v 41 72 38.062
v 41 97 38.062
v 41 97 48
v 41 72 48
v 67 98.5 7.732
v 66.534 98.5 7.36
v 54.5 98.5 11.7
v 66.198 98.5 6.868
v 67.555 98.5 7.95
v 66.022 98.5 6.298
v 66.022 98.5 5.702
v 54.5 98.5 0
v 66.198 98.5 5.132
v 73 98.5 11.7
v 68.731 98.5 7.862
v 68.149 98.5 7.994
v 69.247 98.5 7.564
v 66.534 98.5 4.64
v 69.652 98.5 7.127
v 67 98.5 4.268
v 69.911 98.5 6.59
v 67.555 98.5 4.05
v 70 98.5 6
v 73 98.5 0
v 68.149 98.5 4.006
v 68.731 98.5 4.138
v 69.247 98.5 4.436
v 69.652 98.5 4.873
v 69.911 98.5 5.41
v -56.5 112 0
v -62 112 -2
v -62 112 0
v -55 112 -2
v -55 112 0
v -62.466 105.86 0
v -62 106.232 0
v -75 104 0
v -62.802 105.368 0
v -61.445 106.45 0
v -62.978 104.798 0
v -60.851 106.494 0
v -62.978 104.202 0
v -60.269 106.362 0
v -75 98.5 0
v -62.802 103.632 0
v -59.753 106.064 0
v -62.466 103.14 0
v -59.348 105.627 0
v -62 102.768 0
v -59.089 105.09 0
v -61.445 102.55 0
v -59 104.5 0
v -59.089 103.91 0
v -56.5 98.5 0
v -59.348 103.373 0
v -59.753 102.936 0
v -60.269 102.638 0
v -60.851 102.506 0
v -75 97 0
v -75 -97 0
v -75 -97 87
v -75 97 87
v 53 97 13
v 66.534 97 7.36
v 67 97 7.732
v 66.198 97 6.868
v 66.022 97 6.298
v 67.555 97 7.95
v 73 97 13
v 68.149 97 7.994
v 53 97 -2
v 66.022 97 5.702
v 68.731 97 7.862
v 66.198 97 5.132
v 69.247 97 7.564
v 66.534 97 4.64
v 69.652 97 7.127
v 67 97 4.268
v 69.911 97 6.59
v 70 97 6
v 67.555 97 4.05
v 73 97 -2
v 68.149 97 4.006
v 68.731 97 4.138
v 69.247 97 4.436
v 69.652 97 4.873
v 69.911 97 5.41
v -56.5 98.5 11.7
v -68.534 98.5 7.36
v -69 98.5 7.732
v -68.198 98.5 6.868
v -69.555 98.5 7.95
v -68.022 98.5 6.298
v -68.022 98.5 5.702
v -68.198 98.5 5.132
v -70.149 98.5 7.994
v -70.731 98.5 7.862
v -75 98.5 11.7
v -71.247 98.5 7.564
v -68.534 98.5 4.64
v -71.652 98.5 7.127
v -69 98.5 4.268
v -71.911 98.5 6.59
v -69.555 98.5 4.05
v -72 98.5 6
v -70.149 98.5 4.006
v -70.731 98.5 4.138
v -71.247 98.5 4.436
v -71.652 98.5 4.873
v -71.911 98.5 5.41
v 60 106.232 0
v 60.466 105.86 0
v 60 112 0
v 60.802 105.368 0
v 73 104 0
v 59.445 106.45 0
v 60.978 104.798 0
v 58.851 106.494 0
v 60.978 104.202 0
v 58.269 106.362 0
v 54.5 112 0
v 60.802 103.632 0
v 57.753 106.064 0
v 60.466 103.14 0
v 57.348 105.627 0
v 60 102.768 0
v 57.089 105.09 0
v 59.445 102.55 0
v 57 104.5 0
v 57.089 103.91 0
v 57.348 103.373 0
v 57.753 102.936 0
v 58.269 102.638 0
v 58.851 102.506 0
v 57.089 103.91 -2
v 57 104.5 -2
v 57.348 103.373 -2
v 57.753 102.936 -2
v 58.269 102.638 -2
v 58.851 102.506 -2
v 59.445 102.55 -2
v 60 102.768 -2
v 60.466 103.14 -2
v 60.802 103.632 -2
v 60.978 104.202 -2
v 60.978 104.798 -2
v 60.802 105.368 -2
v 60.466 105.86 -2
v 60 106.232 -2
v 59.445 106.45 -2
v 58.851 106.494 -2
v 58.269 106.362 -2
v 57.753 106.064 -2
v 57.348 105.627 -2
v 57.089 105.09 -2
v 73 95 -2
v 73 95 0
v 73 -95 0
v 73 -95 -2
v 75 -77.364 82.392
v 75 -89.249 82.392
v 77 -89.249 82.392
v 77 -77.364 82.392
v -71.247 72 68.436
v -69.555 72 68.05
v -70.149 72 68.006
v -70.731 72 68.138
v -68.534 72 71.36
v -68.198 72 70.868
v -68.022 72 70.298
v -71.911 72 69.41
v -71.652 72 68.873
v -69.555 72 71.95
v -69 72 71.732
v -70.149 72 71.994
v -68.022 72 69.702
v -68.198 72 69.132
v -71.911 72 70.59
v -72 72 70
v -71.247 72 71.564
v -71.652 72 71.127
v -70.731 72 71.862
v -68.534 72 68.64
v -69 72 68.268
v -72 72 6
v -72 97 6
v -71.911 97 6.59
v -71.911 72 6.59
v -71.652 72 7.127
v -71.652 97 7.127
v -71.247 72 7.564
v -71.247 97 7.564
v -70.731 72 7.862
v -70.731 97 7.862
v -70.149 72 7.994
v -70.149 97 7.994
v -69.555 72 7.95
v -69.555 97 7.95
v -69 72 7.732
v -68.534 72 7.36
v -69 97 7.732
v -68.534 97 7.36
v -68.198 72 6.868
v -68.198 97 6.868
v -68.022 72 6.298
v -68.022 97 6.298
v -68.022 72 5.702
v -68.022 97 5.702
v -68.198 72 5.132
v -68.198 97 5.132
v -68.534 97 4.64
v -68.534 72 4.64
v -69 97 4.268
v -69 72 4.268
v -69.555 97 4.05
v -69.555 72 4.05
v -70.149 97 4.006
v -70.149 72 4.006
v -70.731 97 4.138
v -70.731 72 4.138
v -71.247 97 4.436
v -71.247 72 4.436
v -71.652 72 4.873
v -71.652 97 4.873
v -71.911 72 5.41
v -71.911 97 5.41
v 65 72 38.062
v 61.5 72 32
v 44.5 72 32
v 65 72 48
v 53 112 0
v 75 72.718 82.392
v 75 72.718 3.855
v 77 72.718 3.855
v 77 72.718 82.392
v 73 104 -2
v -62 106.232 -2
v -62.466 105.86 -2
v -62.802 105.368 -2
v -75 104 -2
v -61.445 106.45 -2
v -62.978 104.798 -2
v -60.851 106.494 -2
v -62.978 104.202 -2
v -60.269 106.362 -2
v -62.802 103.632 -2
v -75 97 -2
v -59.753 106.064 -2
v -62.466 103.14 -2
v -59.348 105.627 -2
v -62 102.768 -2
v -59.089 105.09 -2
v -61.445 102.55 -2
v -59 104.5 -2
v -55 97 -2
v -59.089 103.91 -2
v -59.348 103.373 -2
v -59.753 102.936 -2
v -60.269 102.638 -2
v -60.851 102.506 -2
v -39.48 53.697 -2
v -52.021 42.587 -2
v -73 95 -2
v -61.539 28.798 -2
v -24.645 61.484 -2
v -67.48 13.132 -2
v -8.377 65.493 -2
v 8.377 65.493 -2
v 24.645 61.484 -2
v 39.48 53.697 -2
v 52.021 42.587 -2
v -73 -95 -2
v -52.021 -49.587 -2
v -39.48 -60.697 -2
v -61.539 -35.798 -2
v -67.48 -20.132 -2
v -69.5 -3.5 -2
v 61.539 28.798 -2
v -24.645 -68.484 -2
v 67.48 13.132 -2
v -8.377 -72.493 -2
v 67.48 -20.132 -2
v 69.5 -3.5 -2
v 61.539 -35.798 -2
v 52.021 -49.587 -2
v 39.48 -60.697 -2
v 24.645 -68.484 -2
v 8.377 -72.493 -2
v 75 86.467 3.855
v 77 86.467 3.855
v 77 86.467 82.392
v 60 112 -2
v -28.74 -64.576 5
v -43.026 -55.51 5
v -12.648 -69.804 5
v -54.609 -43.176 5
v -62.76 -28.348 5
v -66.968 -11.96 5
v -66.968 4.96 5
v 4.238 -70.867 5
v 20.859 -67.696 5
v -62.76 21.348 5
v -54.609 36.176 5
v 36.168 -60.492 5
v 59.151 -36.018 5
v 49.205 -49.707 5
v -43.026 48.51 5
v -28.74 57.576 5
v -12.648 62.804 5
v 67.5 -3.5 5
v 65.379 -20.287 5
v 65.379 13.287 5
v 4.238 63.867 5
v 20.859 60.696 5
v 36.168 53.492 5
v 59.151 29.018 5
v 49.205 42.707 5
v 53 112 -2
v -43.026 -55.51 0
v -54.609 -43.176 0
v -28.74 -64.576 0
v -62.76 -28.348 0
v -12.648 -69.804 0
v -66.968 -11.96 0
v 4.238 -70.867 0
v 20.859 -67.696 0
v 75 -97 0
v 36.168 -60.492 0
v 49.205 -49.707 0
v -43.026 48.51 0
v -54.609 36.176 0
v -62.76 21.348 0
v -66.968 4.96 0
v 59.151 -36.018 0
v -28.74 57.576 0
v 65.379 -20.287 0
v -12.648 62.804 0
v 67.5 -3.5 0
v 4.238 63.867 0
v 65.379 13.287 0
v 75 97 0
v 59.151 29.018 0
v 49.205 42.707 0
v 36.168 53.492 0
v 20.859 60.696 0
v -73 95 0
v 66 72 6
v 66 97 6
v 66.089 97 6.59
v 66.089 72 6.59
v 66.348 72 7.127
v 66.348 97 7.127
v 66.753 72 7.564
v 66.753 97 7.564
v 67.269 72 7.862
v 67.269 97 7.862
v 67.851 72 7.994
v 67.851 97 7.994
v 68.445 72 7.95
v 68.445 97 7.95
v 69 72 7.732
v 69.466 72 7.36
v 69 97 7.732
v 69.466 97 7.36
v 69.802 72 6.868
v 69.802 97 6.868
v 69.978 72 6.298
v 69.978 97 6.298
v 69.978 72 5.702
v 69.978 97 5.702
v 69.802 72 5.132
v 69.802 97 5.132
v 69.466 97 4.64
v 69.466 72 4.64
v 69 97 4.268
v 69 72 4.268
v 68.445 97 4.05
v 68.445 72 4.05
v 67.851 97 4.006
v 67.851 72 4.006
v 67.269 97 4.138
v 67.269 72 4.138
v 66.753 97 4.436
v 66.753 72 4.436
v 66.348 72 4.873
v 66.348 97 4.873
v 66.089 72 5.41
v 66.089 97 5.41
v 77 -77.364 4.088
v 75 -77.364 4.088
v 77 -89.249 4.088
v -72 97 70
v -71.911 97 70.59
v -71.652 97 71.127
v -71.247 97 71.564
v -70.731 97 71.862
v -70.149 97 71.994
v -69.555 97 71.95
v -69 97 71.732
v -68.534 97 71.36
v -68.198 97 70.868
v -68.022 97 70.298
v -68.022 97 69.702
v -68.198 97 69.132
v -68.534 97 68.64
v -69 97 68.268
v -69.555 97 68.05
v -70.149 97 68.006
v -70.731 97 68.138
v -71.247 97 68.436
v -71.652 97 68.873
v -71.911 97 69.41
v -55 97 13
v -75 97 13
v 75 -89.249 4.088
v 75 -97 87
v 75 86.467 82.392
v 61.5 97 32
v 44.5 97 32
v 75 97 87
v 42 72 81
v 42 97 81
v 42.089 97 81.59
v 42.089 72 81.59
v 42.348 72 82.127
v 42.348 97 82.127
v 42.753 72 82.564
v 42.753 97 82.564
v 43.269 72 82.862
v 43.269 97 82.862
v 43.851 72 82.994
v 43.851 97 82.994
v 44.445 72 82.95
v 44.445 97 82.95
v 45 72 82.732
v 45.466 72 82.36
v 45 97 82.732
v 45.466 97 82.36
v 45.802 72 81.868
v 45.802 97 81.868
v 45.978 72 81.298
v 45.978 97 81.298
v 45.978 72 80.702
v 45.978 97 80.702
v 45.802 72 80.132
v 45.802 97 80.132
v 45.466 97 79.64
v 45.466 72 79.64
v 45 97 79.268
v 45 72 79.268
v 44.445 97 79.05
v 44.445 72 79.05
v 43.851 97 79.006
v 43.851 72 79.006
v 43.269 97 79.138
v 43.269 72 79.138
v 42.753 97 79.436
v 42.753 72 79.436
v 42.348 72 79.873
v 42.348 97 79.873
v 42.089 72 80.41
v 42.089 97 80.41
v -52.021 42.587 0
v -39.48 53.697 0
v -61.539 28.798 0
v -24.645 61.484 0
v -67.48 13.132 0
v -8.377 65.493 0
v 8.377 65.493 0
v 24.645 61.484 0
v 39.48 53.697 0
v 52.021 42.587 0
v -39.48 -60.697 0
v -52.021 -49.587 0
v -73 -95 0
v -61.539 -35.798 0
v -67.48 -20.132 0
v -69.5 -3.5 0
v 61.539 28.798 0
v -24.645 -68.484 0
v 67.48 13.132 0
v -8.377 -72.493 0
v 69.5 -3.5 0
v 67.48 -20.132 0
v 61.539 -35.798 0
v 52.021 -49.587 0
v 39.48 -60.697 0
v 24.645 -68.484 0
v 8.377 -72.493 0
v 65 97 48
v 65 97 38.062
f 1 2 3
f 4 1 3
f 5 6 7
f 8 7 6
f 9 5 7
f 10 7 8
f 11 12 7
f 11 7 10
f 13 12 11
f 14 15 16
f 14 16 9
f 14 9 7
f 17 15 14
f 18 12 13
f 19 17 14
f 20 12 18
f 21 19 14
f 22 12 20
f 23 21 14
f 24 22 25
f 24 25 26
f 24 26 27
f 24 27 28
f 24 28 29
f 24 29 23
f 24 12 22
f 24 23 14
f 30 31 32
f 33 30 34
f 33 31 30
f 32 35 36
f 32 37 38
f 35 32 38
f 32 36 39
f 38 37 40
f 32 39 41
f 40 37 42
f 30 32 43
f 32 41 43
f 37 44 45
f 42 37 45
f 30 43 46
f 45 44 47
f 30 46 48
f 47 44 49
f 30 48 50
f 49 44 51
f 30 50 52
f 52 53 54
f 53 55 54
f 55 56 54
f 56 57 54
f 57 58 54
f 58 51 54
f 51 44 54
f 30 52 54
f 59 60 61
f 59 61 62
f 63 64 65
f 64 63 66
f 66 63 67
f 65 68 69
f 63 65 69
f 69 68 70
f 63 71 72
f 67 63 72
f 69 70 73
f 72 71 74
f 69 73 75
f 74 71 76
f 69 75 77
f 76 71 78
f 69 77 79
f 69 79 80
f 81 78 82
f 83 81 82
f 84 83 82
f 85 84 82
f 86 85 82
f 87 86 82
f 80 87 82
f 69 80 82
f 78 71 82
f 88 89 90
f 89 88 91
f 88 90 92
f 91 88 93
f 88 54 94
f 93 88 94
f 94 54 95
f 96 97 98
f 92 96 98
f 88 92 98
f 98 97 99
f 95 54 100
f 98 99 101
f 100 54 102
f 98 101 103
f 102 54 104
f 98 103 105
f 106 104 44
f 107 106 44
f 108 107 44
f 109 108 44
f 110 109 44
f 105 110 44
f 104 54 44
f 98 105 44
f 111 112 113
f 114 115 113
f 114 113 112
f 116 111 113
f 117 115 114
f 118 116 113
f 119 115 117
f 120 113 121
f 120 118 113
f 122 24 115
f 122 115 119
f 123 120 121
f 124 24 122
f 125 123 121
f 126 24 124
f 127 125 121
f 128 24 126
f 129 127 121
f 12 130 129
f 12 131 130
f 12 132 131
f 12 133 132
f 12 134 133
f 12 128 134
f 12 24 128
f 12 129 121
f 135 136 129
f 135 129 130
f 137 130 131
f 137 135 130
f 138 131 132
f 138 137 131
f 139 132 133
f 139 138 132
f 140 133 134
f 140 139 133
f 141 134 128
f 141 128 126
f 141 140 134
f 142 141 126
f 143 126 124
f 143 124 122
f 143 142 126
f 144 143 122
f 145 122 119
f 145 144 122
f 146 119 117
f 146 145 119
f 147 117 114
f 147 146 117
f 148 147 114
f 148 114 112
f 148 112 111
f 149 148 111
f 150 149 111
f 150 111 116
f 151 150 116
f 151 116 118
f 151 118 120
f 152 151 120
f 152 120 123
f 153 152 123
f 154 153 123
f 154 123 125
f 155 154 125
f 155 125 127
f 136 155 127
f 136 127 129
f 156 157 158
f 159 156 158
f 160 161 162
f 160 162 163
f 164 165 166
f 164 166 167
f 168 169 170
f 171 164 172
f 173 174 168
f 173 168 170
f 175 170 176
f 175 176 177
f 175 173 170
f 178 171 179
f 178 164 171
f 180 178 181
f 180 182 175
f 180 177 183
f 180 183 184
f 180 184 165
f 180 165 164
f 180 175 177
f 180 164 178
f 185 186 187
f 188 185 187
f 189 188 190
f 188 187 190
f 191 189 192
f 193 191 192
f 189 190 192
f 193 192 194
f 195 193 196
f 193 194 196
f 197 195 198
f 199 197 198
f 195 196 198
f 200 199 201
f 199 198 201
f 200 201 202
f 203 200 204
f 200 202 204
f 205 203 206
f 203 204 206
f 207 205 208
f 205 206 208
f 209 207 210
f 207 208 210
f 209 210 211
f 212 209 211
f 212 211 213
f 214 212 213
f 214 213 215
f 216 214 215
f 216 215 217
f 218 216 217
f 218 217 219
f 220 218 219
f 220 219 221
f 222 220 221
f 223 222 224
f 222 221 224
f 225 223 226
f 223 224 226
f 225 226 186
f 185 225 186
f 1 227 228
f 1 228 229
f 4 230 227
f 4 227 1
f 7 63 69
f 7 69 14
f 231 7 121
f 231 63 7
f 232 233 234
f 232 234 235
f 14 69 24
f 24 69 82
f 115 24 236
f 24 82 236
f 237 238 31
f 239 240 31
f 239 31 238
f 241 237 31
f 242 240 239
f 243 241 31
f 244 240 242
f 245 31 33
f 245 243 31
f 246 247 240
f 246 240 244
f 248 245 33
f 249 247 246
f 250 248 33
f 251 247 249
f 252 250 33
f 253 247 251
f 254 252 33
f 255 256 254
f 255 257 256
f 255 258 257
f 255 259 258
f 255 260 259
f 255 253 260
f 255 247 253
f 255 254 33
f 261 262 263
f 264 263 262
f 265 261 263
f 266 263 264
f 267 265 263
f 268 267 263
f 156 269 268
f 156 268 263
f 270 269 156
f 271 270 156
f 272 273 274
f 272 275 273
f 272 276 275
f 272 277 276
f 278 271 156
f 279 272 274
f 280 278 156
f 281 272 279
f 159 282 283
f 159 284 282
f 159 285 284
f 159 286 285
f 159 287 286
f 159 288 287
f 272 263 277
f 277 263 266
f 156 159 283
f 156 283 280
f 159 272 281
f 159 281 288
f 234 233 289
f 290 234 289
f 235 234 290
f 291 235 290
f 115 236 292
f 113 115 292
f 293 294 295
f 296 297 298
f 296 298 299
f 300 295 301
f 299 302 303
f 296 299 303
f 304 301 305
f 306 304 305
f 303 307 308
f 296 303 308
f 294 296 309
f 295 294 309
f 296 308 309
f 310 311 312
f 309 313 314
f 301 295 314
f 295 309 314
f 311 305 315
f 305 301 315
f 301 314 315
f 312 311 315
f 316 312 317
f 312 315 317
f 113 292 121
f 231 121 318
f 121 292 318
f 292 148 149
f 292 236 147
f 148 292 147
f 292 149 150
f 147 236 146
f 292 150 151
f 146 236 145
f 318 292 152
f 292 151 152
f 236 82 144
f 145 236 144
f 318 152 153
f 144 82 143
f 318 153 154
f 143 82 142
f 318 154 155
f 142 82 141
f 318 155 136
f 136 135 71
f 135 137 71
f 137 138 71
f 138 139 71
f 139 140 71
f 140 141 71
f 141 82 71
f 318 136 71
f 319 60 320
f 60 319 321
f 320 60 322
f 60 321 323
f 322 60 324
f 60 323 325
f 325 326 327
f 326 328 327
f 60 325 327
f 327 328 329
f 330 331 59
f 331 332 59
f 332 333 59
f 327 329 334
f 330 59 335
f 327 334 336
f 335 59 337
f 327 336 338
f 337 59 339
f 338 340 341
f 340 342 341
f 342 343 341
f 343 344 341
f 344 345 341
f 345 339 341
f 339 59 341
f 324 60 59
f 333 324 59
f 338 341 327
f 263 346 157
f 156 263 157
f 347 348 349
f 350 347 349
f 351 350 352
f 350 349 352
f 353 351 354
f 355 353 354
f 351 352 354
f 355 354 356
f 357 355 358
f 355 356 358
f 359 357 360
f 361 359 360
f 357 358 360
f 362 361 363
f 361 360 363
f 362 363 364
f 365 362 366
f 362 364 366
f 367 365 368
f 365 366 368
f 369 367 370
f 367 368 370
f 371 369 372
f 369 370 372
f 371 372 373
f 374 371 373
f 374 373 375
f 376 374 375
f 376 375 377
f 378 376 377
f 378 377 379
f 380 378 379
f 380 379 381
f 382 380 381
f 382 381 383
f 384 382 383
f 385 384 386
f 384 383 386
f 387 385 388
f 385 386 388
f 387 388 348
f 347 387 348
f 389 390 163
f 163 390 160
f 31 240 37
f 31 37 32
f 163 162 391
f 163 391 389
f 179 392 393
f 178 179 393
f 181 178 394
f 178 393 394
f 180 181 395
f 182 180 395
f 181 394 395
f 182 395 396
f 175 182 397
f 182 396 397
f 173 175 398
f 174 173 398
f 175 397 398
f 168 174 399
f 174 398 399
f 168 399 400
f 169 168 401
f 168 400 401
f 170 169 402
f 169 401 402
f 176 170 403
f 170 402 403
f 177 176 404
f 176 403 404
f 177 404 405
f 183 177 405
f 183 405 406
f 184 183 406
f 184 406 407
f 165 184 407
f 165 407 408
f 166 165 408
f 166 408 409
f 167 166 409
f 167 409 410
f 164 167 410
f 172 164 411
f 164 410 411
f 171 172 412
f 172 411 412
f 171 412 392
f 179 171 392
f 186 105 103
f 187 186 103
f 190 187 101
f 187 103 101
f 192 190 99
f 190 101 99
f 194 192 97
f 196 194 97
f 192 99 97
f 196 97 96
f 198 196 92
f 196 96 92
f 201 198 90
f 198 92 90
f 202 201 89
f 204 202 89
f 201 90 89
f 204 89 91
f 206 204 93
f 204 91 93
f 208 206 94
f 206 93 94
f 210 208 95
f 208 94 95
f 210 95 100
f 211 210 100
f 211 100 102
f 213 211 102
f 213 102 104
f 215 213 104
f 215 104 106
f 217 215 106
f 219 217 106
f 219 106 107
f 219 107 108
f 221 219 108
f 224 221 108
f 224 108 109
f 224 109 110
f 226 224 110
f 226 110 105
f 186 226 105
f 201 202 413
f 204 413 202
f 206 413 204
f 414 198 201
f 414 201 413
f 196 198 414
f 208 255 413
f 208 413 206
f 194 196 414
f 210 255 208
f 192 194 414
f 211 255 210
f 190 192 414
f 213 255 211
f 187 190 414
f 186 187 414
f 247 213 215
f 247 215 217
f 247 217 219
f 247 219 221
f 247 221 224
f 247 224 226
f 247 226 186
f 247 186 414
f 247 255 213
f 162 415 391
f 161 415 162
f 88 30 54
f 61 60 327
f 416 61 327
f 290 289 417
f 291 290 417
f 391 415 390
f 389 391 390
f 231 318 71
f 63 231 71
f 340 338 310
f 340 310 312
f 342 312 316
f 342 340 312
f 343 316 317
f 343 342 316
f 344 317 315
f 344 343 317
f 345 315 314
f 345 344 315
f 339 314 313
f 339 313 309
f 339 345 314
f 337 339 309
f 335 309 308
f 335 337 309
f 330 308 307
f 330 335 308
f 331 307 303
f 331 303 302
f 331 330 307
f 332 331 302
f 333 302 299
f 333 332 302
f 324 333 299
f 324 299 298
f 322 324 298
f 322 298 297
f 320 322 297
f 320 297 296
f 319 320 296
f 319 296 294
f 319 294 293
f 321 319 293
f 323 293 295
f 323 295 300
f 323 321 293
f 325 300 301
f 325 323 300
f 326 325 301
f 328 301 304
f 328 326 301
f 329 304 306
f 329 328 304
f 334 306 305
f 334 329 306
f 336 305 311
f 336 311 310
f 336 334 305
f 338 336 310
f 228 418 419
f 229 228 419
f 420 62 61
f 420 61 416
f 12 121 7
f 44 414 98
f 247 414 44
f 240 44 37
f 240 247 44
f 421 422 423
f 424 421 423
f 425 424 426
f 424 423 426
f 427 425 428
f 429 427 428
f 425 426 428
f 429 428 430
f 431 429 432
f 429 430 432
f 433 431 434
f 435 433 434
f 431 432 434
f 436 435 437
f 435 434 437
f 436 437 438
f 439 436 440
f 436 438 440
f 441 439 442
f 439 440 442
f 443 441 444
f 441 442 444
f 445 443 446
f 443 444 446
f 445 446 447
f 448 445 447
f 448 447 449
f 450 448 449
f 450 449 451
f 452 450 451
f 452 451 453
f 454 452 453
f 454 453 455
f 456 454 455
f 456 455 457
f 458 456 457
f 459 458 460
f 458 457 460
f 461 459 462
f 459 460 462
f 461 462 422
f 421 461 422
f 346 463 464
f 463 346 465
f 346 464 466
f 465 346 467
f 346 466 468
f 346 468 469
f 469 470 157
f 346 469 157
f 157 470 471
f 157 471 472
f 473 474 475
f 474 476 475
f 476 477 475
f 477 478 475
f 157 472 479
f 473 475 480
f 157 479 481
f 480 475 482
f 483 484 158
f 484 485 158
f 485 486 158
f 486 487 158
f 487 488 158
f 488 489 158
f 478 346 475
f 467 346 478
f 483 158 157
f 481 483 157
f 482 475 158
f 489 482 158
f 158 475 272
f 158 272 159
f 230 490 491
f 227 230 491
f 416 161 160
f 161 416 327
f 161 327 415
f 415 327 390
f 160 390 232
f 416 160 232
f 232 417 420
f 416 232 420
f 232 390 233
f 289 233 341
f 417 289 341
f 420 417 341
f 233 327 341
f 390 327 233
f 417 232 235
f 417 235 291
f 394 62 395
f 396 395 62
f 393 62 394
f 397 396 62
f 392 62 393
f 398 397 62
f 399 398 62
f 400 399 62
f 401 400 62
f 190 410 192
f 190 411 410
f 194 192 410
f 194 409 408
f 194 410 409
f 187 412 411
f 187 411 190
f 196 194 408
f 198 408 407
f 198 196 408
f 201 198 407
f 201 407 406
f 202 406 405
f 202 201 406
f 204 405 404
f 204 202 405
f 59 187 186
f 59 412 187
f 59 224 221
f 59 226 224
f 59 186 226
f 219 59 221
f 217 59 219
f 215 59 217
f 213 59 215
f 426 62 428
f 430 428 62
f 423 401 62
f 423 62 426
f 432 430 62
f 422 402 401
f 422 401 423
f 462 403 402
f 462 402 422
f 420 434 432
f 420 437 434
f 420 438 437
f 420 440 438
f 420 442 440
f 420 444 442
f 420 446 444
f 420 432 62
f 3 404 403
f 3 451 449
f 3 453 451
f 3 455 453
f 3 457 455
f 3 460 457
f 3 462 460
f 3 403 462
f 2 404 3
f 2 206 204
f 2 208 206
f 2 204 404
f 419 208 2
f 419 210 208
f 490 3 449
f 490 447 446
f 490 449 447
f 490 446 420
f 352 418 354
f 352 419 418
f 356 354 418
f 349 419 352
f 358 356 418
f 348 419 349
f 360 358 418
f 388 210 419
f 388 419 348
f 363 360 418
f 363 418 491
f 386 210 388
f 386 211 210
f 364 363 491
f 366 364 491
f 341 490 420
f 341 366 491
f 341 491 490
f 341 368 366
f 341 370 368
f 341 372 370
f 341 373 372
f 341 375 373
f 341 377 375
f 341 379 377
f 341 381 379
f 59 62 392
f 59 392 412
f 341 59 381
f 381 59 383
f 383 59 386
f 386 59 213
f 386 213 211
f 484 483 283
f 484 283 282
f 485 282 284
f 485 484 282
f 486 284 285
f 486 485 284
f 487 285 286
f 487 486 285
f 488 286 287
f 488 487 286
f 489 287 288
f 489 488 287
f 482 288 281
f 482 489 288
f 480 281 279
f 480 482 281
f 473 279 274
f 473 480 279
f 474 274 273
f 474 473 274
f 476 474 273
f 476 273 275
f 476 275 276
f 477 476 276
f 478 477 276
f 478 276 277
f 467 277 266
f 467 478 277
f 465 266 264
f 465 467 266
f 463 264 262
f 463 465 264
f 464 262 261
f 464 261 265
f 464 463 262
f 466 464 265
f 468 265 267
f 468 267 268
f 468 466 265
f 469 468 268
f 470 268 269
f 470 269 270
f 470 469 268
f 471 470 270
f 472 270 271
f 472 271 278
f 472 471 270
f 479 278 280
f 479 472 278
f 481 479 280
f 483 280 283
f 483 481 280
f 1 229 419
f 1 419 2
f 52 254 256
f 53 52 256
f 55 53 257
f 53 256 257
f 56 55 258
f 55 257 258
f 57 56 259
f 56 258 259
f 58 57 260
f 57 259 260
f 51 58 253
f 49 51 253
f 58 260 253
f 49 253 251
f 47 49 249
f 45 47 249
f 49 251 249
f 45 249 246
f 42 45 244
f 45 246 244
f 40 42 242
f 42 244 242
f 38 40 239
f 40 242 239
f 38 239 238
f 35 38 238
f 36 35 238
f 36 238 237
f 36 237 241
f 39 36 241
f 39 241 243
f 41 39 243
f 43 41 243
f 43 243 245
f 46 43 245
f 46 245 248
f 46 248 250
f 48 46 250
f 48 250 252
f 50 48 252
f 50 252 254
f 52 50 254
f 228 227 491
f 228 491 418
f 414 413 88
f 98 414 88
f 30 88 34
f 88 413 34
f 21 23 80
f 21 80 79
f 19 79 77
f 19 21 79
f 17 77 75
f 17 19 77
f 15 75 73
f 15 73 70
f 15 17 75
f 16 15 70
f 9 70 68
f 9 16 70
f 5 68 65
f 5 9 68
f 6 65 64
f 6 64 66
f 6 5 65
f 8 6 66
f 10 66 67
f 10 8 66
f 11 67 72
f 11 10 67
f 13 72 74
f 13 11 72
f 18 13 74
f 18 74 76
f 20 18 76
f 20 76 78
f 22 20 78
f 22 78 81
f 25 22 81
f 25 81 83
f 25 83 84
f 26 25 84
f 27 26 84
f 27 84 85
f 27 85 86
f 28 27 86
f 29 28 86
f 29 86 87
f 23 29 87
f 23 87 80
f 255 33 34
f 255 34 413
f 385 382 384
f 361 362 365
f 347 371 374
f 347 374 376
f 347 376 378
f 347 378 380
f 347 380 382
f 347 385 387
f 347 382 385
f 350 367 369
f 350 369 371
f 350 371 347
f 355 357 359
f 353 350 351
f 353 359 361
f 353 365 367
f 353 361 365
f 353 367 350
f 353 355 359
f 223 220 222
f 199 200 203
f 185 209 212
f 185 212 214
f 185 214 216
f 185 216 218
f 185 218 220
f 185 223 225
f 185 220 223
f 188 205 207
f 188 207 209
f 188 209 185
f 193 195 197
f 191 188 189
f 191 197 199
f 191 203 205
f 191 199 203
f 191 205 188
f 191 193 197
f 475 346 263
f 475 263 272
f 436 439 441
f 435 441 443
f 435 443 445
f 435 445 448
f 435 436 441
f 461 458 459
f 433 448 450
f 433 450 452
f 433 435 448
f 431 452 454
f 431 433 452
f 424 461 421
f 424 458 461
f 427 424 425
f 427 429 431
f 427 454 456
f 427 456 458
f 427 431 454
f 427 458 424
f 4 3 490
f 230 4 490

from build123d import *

# Parameters (mm, degrees)
F0_W      = 150
F0_H      = 194
F0_R      = 67.5
F1_DEPTH  = 87
F2_DEPTH  = 5
F3_R      = 2
F4_DEPTH  = 25
F5_W      = 146
F5_H      = 190
F5_R      = 69.5
F6_DEPTH  = 2
F8_R      = 2
F9_DEPTH  = 15
F11_START = -2
F11_DEPTH = 87.001
F13_DEPTH = 25
F14_R     = 2
F15_DEPTH = 3
F18_W     = 11.8853598833
F18_H     = 78.3035373315
F18_W_2   = 13.7497261167
F18_H_2   = 78.5365824122
F19_DEPTH = 2


with BuildPart() as f1:
    # F0 (on Top) → F1 (new body)
    with BuildSketch(Plane.XY):
        Rectangle(F0_W, F0_H)
        with Locations((0, -3.5)):
            Circle(F0_R, mode=Mode.SUBTRACT)
        with Locations((0, -3.5)):
            Circle(F0_R)
    extrude(amount=F1_DEPTH)

    # F0 (on Top) → F2 (cut)
    with BuildSketch(Plane.XY):
        with Locations((0, -3.5)):
            Circle(F0_R)
    extrude(amount=F2_DEPTH, mode=Mode.SUBTRACT)

    # F3 (on face) → F4 (cut)
    with BuildSketch(Plane(origin=(0, 97, 0), x_dir=(-1, 0, 0), z_dir=(0, 1, 0))):
        Polygon((-41, 48), (-65, 48), (-65, 38.0621778265), (-61.5, 32), (-44.5, 32), (-41, 38.0621778265), align=None)
        with Locations((-44, 81)):
            Circle(F3_R)
        with Locations((70, 70)):
            Circle(F3_R)
        with Locations((70, 6)):
            Circle(F3_R)
        with Locations((-68, 6)):
            Circle(F3_R)
    extrude(amount=-F4_DEPTH, mode=Mode.SUBTRACT)

    # F18 (on face) → F19 (join)
    with BuildSketch(Plane.YZ.offset(75)):
        with Locations((-83.3067968488, 43.2401341386)):
            Rectangle(F18_W, F18_H)
        with Locations((79.5925147831, 43.1236115983)):
            Rectangle(F18_W_2, F18_H_2)
    extrude(amount=F19_DEPTH)


with BuildPart() as f6:
    # F5 (on face) → F6 (new body)
    with BuildSketch(Plane(origin=(0, 0, 0), x_dir=(1, 0, 0), z_dir=(0, 0, -1))):
        Rectangle(F5_W, F5_H)
        with Locations((0, 3.5)):
            Circle(F5_R, mode=Mode.SUBTRACT)
    extrude(amount=F6_DEPTH)


with BuildPart() as f9:
    # F8 (on offset) → F9 (new body)
    with BuildSketch(Plane(origin=(0, 0, -2), x_dir=(1, 0, 0), z_dir=(0, 0, -1))):
        Polygon((-55, -97), (-75, -97), (-75, -98.5), (-56.5, -98.5), (-56.5, -112), (-55, -112), align=None)
        Polygon((-56.5, -98.5), (-75, -98.5), (-75, -104), (-62, -112), (-56.5, -112), align=None)
        with Locations((-61, -104.5)):
            Circle(F8_R, mode=Mode.SUBTRACT)
    extrude(amount=-F9_DEPTH)

    # F8 (on offset) → F11 (cut)
    with BuildSketch(Plane(origin=(0, 0, -2), x_dir=(1, 0, 0), z_dir=(0, 0, -1)).offset(F11_START)):
        Polygon((-56.5, -98.5), (-75, -98.5), (-75, -104), (-62, -112), (-56.5, -112), align=None)
        with Locations((-61, -104.5)):
            Circle(F8_R, mode=Mode.SUBTRACT)
    extrude(amount=-F11_DEPTH, mode=Mode.SUBTRACT)

    # F12 (on face) → F13 (cut)
    with BuildSketch(Plane.YZ.offset(-55)):
        Polygon((97, 17.1633157879), (97, 13), (112, 0), (116.2648648024, 0), (116.2648648024, 17.1633157879), align=None)
    extrude(amount=-F13_DEPTH, mode=Mode.SUBTRACT)

    # F14 (on face) → F15 (cut)
    with BuildSketch(Plane(origin=(0, 98.5, 0), x_dir=(-1, 0, 0), z_dir=(0, 1, 0))):
        with Locations((70, 6)):
            Circle(F14_R)
    extrude(amount=-F15_DEPTH, mode=Mode.SUBTRACT)


with BuildPart() as f16_1:
    # F16: instance of F9
    add(f9.part.mirror(Plane.YZ))


with BuildPart() as f16_1_1:
    # F17: moved
    add(f16_1.part.moved(Location((-2, 0, 0))))


solid = Compound([f1.part, f6.part, f9.part, f16_1_1.part])
